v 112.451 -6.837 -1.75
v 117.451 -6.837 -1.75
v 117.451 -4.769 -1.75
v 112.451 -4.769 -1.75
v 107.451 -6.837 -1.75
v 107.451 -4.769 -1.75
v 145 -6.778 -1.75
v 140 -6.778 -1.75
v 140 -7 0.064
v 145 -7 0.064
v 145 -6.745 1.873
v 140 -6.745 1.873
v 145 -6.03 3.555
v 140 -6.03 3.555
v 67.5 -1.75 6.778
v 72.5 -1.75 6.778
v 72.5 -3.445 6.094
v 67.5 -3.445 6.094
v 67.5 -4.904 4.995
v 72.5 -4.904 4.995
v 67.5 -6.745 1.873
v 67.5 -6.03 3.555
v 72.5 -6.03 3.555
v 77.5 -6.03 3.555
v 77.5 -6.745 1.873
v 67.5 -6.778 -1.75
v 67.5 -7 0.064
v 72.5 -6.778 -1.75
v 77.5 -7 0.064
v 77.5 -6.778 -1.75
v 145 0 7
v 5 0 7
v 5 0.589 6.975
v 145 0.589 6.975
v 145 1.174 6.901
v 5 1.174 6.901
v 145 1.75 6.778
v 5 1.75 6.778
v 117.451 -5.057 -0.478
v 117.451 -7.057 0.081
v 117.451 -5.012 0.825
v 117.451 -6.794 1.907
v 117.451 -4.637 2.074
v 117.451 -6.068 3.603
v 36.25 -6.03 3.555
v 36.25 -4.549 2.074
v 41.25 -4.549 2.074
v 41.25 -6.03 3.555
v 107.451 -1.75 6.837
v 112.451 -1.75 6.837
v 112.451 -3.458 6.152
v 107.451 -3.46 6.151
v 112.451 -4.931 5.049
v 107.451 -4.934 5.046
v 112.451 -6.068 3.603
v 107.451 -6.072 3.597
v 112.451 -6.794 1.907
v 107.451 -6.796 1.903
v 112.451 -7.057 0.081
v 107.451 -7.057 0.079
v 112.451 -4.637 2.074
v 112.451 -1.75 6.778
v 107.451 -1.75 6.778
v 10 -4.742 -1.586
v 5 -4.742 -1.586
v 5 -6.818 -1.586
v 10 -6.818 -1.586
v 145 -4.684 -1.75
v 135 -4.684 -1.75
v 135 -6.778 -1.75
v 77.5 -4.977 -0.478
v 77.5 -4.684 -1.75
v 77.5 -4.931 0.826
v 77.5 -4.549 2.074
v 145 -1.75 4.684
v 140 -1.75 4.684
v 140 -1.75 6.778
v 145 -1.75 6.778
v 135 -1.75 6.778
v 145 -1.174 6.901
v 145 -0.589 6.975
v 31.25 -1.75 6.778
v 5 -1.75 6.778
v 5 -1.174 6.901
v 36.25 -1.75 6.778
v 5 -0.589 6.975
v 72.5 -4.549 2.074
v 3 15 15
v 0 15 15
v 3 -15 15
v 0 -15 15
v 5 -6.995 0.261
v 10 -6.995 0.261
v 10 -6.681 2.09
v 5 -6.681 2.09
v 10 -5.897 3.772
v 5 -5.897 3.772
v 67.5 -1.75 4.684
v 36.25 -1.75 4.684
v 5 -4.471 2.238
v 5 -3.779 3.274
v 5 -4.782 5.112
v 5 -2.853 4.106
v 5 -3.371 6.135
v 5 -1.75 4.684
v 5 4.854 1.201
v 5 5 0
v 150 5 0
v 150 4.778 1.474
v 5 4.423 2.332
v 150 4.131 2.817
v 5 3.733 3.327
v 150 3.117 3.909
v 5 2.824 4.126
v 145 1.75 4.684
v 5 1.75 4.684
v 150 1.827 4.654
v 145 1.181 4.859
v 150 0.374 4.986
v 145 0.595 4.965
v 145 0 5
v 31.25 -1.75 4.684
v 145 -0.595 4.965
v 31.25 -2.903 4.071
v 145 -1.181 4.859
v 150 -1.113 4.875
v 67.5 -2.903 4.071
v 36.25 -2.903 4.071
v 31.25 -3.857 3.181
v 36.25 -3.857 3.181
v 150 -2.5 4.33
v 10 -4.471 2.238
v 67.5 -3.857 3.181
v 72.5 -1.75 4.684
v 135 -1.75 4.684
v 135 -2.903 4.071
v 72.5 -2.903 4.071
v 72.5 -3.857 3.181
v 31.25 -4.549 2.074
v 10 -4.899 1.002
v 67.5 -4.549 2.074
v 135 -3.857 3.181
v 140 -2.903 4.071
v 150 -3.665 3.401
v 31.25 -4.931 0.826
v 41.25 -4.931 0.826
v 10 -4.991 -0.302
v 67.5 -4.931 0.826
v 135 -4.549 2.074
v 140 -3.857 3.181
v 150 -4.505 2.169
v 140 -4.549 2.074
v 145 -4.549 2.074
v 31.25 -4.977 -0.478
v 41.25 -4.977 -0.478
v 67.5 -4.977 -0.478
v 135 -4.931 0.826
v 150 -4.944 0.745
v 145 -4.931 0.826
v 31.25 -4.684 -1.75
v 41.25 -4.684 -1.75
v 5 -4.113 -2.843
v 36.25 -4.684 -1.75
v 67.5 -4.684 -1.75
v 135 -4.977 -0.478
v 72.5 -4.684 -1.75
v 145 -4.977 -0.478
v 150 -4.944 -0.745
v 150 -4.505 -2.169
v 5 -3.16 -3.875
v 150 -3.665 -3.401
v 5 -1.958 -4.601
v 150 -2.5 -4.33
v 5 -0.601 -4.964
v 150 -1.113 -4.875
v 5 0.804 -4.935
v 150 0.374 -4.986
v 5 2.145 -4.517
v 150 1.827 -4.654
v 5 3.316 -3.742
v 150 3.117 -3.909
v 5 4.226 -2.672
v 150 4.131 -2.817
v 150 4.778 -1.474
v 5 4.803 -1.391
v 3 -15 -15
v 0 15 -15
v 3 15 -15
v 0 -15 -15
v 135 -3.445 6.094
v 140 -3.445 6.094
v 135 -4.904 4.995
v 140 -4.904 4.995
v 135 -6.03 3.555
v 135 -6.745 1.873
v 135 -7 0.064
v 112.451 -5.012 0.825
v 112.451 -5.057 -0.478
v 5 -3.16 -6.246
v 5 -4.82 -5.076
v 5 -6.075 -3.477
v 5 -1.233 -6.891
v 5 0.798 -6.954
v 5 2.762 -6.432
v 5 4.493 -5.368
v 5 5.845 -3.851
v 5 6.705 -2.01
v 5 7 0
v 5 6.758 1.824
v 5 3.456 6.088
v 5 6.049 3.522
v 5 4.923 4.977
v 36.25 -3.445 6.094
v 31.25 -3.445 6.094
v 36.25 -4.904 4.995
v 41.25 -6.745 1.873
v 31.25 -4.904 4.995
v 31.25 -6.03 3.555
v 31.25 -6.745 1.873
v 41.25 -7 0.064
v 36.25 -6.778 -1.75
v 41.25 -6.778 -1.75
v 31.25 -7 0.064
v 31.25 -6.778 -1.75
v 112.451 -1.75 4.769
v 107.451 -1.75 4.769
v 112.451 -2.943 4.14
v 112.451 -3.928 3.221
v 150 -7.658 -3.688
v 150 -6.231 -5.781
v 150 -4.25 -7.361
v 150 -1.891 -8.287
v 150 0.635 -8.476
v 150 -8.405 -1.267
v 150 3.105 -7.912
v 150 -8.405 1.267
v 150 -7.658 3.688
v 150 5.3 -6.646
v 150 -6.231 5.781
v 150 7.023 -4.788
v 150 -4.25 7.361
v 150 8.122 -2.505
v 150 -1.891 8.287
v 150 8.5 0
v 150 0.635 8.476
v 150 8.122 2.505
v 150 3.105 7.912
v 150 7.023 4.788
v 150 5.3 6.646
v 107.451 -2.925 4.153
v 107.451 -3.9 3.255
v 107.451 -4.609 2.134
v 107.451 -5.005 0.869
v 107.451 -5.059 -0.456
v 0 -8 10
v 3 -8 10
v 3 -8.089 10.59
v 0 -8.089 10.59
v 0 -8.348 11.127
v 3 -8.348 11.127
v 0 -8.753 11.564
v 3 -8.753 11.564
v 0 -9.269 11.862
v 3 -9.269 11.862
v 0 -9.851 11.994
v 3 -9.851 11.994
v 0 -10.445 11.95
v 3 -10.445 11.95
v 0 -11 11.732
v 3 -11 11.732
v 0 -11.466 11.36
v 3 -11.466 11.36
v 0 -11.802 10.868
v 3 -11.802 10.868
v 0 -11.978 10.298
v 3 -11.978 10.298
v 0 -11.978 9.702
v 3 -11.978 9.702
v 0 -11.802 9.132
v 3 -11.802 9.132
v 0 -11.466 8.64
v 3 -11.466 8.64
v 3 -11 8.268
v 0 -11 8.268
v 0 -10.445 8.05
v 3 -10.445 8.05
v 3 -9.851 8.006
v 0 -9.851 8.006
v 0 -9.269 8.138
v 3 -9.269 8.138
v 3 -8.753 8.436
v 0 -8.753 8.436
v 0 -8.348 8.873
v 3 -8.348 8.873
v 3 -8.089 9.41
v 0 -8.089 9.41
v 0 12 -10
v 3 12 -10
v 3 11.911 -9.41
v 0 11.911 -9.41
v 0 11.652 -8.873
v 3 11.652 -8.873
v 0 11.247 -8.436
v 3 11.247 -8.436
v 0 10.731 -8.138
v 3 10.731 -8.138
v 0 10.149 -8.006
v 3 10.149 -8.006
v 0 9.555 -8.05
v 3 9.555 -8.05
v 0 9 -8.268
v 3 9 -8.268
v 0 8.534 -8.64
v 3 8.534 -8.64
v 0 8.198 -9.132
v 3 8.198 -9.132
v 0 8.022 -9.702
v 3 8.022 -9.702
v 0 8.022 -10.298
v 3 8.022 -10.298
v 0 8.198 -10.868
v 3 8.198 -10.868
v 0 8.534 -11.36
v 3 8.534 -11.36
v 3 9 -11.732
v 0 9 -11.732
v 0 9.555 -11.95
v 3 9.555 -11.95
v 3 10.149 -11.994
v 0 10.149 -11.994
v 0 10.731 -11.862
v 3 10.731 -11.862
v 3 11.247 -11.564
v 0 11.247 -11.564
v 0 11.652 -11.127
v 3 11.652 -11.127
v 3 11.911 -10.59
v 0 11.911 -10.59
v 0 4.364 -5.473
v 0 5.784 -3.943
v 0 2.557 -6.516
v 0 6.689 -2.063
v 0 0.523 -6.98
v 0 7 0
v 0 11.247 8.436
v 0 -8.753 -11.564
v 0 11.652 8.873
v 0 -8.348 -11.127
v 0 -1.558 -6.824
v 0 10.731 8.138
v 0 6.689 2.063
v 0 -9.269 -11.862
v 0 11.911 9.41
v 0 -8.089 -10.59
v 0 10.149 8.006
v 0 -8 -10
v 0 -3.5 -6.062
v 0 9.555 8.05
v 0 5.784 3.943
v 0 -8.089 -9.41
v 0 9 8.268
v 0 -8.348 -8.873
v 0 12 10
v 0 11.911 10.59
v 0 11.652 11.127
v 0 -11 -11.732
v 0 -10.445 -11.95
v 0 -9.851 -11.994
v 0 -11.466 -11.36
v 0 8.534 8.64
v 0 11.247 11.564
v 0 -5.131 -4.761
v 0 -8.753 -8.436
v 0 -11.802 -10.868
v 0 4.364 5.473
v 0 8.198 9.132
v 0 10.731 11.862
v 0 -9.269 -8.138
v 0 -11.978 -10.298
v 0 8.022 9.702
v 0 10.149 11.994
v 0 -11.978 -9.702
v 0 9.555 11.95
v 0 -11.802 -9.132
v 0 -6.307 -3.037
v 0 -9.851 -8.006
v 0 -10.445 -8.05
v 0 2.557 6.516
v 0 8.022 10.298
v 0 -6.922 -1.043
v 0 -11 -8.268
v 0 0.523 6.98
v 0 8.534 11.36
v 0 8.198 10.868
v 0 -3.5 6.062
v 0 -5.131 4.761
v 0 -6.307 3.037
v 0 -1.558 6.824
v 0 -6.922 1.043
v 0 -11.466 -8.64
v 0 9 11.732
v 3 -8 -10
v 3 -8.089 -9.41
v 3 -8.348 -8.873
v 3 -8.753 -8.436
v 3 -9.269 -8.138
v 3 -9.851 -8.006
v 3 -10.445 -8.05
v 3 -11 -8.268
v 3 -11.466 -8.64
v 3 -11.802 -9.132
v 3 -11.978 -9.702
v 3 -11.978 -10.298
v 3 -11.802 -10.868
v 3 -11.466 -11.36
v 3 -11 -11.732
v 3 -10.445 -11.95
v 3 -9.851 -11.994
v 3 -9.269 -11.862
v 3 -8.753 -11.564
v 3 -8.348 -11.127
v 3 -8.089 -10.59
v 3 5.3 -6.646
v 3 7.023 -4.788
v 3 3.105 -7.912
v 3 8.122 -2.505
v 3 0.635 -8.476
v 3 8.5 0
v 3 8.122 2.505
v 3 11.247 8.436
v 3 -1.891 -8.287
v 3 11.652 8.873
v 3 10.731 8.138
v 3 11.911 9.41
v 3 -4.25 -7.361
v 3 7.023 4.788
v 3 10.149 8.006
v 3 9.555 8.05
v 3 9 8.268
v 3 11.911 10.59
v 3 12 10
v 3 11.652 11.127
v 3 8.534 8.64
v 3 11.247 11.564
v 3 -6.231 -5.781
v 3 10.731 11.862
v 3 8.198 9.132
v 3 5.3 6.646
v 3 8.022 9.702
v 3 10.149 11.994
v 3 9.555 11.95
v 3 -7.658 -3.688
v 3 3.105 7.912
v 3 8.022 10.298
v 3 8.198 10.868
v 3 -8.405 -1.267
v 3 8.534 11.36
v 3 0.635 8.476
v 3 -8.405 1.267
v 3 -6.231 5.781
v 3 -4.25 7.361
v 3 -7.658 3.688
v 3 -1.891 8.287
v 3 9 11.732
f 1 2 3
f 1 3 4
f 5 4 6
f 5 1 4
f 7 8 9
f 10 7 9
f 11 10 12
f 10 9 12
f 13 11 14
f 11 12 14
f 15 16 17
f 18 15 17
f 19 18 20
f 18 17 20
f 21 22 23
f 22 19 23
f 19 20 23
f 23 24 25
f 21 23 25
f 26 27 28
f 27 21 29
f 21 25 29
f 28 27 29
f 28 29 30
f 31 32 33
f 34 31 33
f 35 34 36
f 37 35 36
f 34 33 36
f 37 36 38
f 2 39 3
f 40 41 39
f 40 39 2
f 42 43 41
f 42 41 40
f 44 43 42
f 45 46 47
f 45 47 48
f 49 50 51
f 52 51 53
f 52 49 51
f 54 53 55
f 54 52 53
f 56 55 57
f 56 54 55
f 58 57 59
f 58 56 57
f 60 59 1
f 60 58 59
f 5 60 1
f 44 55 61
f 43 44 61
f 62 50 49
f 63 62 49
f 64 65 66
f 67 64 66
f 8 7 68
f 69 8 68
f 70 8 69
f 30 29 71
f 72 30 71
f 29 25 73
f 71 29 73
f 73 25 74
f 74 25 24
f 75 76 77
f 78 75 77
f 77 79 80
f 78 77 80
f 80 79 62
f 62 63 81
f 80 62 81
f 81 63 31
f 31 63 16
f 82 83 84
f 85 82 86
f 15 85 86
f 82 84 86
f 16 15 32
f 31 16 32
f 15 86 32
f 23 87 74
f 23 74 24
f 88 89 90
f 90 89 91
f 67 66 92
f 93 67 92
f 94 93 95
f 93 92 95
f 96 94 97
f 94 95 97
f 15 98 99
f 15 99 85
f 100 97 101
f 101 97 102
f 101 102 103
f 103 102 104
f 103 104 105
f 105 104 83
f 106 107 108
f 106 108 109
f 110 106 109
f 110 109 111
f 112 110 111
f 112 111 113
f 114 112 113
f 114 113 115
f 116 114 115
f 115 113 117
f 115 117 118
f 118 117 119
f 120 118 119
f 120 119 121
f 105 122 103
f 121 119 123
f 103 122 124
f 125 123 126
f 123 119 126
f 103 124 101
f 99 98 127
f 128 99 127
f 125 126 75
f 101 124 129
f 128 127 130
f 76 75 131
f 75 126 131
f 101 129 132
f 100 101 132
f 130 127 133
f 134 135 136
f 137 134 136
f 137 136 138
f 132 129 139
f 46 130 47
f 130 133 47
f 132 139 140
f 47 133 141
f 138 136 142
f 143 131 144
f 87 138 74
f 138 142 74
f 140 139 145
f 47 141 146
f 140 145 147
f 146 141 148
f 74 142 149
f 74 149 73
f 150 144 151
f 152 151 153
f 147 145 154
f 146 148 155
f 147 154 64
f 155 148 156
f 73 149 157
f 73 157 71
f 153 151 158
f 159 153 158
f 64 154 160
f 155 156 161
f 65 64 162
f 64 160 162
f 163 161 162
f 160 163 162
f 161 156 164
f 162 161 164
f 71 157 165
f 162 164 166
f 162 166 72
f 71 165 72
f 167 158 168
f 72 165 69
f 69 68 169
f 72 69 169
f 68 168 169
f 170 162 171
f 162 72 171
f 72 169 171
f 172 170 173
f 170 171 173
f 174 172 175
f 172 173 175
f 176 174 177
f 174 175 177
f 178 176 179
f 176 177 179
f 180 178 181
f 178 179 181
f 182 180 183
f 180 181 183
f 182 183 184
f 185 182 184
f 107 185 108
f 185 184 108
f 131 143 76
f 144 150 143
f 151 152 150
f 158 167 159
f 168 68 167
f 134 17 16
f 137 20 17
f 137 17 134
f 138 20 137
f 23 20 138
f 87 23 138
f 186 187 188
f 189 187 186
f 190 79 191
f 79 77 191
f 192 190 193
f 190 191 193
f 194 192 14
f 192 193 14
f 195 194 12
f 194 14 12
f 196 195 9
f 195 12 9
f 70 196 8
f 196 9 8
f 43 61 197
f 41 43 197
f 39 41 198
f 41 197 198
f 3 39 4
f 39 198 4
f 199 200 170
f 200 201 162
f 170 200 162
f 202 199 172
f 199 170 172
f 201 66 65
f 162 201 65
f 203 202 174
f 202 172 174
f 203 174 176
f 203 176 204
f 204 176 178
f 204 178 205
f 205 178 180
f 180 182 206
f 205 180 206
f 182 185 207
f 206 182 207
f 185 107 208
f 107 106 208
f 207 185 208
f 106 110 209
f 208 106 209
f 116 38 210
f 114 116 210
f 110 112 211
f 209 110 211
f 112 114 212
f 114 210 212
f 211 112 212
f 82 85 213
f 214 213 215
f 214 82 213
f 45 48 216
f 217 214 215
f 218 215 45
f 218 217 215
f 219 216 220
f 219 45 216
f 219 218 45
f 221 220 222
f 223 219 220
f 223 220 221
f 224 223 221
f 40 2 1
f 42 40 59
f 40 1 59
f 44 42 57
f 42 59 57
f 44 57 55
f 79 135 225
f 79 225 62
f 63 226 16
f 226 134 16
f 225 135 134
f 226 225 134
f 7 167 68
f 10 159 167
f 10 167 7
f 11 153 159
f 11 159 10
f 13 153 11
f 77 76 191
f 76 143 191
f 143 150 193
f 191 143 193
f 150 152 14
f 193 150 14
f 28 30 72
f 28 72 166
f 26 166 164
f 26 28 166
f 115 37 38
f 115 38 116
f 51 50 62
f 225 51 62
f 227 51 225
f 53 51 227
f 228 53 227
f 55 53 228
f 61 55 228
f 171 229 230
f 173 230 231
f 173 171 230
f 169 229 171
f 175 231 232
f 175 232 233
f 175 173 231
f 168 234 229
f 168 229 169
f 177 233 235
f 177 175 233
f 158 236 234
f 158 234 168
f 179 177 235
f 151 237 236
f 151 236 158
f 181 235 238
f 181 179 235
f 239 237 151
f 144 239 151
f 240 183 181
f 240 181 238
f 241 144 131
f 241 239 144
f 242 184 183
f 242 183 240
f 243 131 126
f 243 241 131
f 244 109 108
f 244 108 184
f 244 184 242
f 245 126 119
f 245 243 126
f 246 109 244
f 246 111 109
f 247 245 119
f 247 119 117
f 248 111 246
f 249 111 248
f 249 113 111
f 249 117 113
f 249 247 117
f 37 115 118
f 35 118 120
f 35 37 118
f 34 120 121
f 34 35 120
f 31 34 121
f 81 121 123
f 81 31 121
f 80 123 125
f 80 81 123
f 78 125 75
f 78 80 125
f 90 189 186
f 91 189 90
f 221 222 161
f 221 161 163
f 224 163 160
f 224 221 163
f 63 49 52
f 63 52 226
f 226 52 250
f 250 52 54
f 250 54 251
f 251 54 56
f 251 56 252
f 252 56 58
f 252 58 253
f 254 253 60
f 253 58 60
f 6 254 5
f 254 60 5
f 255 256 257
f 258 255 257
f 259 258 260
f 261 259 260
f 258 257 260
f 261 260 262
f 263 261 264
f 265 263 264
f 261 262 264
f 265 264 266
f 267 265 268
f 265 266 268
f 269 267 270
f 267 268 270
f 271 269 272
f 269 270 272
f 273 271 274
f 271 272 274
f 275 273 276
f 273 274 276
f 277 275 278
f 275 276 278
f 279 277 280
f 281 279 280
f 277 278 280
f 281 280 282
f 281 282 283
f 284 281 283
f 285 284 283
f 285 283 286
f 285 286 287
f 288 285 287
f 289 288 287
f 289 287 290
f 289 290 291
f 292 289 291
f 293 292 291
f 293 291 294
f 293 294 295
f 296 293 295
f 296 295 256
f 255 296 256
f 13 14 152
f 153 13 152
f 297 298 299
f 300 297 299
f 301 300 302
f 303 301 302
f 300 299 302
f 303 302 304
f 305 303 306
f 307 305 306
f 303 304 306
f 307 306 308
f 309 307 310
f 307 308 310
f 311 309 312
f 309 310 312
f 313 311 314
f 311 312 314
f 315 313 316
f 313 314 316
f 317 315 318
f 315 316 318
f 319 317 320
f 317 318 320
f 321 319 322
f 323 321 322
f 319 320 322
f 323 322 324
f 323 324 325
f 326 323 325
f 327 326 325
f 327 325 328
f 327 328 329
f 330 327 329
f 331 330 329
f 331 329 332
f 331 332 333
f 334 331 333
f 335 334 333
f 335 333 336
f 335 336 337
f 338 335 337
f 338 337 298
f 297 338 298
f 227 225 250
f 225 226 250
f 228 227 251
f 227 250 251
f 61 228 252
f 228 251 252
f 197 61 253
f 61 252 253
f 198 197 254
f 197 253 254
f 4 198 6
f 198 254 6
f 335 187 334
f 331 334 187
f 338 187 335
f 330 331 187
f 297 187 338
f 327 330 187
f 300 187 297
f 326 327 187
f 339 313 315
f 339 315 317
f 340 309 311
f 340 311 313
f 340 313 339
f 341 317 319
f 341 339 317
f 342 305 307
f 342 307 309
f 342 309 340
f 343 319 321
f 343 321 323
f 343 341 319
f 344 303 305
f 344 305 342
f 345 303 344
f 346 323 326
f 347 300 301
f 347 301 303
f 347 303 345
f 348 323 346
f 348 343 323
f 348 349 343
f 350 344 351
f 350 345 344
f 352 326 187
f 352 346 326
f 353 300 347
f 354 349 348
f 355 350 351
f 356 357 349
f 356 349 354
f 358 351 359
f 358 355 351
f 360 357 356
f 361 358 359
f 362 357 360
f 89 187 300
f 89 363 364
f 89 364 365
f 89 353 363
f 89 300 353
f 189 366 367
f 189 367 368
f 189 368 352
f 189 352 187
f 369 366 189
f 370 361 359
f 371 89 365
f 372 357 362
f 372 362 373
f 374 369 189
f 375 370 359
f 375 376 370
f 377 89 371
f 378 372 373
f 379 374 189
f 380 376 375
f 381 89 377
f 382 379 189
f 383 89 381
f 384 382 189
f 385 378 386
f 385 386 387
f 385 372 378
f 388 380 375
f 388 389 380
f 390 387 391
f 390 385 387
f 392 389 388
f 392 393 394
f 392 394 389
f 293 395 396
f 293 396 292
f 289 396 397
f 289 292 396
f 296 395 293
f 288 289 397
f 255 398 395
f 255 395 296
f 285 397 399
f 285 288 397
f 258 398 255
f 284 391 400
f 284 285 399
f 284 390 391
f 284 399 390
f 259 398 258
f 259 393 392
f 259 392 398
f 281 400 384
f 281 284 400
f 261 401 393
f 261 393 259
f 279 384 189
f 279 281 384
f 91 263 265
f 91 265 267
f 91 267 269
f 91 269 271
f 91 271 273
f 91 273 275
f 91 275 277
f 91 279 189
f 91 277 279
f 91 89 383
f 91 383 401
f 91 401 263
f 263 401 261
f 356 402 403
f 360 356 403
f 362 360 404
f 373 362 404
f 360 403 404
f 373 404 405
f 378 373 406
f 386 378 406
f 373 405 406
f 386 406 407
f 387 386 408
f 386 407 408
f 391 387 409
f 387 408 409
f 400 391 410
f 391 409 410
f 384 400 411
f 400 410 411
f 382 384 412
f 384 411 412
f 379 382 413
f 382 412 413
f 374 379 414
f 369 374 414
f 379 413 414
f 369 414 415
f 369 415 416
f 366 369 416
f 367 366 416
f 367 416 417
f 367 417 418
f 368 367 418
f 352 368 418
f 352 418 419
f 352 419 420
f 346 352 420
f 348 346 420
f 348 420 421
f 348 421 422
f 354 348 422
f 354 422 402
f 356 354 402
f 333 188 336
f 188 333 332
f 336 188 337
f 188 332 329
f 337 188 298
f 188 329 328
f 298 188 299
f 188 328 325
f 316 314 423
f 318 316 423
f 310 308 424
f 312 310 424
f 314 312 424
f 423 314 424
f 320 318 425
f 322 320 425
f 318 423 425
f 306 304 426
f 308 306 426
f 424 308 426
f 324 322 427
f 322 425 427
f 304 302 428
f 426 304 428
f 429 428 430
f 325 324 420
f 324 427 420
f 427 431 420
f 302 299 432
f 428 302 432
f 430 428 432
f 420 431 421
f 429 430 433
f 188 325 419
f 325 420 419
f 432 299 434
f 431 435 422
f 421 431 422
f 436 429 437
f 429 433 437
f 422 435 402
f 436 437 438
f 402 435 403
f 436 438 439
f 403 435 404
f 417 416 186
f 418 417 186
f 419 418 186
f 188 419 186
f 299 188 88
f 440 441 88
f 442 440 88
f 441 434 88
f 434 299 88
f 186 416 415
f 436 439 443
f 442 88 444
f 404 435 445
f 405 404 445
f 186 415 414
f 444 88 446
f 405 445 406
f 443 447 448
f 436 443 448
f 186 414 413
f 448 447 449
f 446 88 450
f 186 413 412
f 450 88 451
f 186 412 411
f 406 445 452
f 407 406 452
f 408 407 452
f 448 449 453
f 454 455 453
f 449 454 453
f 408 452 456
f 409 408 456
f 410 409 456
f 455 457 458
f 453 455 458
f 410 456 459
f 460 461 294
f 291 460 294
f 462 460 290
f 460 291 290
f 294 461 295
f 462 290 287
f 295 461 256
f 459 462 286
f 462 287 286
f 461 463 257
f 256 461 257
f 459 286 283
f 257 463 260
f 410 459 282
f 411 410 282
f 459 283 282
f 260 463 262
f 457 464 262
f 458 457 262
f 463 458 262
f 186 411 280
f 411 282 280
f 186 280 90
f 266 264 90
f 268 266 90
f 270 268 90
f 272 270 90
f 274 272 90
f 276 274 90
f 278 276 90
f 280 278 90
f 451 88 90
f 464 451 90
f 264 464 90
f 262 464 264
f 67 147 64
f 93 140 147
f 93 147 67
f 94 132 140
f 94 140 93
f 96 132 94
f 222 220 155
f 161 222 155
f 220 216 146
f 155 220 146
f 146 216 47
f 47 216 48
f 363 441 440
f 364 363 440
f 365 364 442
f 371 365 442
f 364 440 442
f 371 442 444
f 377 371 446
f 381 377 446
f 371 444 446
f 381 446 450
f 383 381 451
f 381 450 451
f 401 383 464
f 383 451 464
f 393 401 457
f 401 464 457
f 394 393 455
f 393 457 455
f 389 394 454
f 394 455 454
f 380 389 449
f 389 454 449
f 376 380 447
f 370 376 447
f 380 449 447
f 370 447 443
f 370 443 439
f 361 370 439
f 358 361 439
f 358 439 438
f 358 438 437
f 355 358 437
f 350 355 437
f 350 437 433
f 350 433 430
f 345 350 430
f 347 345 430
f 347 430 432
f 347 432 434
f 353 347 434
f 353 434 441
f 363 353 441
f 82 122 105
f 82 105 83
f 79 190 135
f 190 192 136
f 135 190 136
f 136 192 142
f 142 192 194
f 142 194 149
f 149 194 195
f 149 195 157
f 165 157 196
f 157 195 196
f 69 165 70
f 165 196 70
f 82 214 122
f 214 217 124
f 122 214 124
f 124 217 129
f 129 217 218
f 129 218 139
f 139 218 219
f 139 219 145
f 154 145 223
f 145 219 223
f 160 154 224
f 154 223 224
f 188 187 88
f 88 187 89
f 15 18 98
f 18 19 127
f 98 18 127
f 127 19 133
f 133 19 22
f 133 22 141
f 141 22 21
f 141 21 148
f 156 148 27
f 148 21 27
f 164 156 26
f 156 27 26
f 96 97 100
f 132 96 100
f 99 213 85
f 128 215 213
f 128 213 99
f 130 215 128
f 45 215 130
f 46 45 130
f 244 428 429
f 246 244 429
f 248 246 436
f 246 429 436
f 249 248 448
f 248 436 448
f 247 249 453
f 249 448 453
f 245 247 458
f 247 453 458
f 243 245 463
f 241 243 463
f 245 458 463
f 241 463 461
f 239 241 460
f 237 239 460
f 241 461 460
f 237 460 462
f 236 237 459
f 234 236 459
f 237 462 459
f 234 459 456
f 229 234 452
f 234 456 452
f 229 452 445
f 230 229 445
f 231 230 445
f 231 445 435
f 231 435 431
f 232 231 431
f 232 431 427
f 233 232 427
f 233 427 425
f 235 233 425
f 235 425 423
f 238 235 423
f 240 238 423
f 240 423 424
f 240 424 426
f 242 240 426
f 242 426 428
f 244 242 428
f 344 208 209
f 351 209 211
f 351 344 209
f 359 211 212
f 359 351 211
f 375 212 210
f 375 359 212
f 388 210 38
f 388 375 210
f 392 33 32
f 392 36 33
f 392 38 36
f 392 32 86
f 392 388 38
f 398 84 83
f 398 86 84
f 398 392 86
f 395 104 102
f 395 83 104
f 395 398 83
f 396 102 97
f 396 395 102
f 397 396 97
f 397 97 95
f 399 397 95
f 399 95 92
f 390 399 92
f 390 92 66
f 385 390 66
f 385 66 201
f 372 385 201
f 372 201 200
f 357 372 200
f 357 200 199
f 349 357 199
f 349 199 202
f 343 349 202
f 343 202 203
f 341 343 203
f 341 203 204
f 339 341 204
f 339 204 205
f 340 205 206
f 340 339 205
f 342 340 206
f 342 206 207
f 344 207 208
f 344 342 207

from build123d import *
from build123d import SkipClean  # not in build123d's __all__

# Parameters (mm, degrees)
F0_R      = 8.5
F0_R_2    = 7
F1_DEPTH  = 150
F2_R      = 7
F2_R_2    = 5
F3_DEPTH  = 145
F4_W      = 30
F4_H      = 30
F4_R      = 8.5
F5_DEPTH  = 3
F7_D      = 4
F9_DEPTH  = 140
F12_ANGLE = 90
F14_DEPTH = 5
F15_W     = 2.5
F15_H     = 2.0939723571
F16_ANGLE = 90
F18_DEPTH = 10
F19_W     = 5
F19_H     = 2.0680303106
F20_ANGLE = 90
F22_DEPTH = 5
F23_W     = 5
F23_H     = 2.0939723571
F24_ANGLE = 90
F26_DEPTH = 10
F27_W     = 5
F27_H     = 2.0939723571
F28_ANGLE = 90
F30_DEPTH = 5


# Not quite as in the source:
# - after a boolean that leaves OpenCascade's solid faulty, fix() repairs it


with BuildPart() as f1:
    # F0 (on Right) → F1 (new body)
    with BuildSketch(Plane.YZ):
        Circle(F0_R)
        Circle(F0_R_2, mode=Mode.SUBTRACT)
    extrude(amount=F1_DEPTH)

    # F2 (on face) → F3 (join)
    with BuildSketch(Plane.YZ.offset(150)):
        Circle(F2_R)
        Circle(F2_R_2, mode=Mode.SUBTRACT)
    extrude(amount=-F3_DEPTH)

    # F4 (on face) → F5 (join)
    with BuildSketch(Plane(origin=(0, 0, 0), x_dir=(0, -1, 0), z_dir=(-1, 0, 0))):
        Rectangle(F4_W, F4_H)
        Circle(F4_R, mode=Mode.SUBTRACT)
    extrude(amount=-F5_DEPTH)

    # F7 (through all)
    with Locations(Plane(origin=(0, 0, 0), x_dir=(0, -1, 0), z_dir=(-1, 0, 0))):
        with Locations((-10, 10), (10, 10), (10, -10), (-10, -10)):
            Hole(F7_D / 2)

    # F8 (on face) → F9 (cut)
    with BuildSketch(Plane(origin=(5, 0, 0), x_dir=(0, -1, 0), z_dir=(-1, 0, 0))):
        with BuildLine():
            ThreePointArc((0, 5), (0.8891730726, 4.9203019467), (1.75, 4.6837484988))
            Line((1.75, 4.6837484988), (1.75, 6.7777208559))
            ThreePointArc((1.75, 6.7777208559), (0.8820300474, 6.9442078739), (0, 7))
            Line((0, 7), (0, 5))
        make_face()
        with BuildLine():
            ThreePointArc((-1.75, 4.6837484988), (-0.8891730726, 4.9203019467), (0, 5))
            Line((0, 5), (0, 7))
            ThreePointArc((0, 7), (-0.8820300474, 6.9442078739), (-1.75, 6.7777208559))
            Line((-1.75, 6.7777208559), (-1.75, 4.6837484988))
        make_face()
    extrude(amount=-F9_DEPTH, mode=Mode.SUBTRACT)

    # F10 (on face) → F12 (revolve, cut)
    with BuildSketch(Plane(origin=(0, -1.75, 0), x_dir=(-1, 0, 0), z_dir=(0, 1, 0))):
        Polygon((-140, 6.7777208559), (-140, 4.7096905453), (-140, 4.6837484988), (-135, 4.6837484988), (-135, 6.7777208559), align=None)
    revolve(axis=Axis((74.9857723713, 0, 0), (1, 0, 0)), revolution_arc=F12_ANGLE, mode=Mode.SUBTRACT)

    # F13 (on face) → F14 (cut)
    with BuildSketch(Plane(origin=(140, 0, 0), x_dir=(0, -1, 0), z_dir=(-1, 0, 0))):
        with BuildLine():
            Line((6.0300092452, 3.5551355111), (4.5493471919, 2.0744734578))
            ThreePointArc((4.5493471919, 2.0744734578), (4.9969153801, 0.17560377), (4.6837484988, -1.75))
            Line((4.6837484988, -1.75), (6.7777208559, -1.75))
            ThreePointArc((6.7777208559, -1.75), (6.9314935824, 0.9769322988), (6.0300092452, 3.5551355111))
        make_face()
    with SkipClean():  # cleaning this boolean's faces spoils the solid; the shape is the same uncleaned
        extrude(amount=-F14_DEPTH, mode=Mode.SUBTRACT)

    # F15 (on face) → F16 (revolve, cut)
    with BuildSketch(Plane(origin=(0, -1.75, 0), x_dir=(-1, 0, 0), z_dir=(0, 1, 0))):
        with Locations((-68.75, 5.7307346773)):
            Rectangle(F15_W, F15_H)
        with Locations((-71.25, 5.7307346773)):
            Rectangle(F15_W, F15_H)
    revolve(axis=Axis((74.9857723713, 0, 0), (1, 0, 0)), revolution_arc=F16_ANGLE, mode=Mode.SUBTRACT)

    add(f1.part.fix(), mode=Mode.REPLACE)

    # F17 (on face) → F18 (cut)
    with BuildSketch(Plane.YZ.offset(67.5)):
        with BuildLine():
            ThreePointArc((-4.6837484988, -1.75), (-4.9969153801, 0.17560377), (-4.5493471919, 2.0744734578))
            Line((-4.5493471919, 2.0744734578), (-6.0300092452, 3.5551355111))
            ThreePointArc((-6.0300092452, 3.5551355111), (-6.9314935824, 0.9769322988), (-6.7777208559, -1.75))
            Line((-6.7777208559, -1.75), (-4.6837484988, -1.75))
        make_face()
    extrude(amount=F18_DEPTH, mode=Mode.SUBTRACT)

    # F19 (on face) → F20 (revolve, cut)
    with BuildSketch(Plane(origin=(0, -1.75, 0), x_dir=(-1, 0, 0), z_dir=(0, 1, 0))):
        with Locations((-109.95097965, 5.8026228816)):
            Rectangle(F19_W, F19_H)
    revolve(axis=Axis((112.4786585569, 0, 0), (1, 0, 0)), revolution_arc=F20_ANGLE, mode=Mode.SUBTRACT)

    # F21 (on face) → F22 (cut)
    with BuildSketch(Plane(origin=(112.45097965, 0, 0), x_dir=(0, -1, 0), z_dir=(-1, 0, 0))):
        with BuildLine():
            ThreePointArc((6.8366380369, -1.75), (6.9854372426, 1.0028889159), (6.068155613, 3.6027221796))
            Line((6.068155613, 3.6027221796), (4.6366684016, 2.07447))
            ThreePointArc((4.6366684016, 2.07447), (5.0765586233, 0.1751347812), (4.7686077263, -1.75))
            Line((4.7686077263, -1.75), (6.8366380369, -1.75))
        make_face()
    extrude(amount=-F22_DEPTH, mode=Mode.SUBTRACT)

    # F23 (on face) → F24 (revolve, cut)
    with BuildSketch(Plane(origin=(0, -1.75, 0), x_dir=(-1, 0, 0), z_dir=(0, 1, 0))):
        with Locations((-33.75, 5.7307346773)):
            Rectangle(F23_W, F23_H)
    revolve(axis=Axis((74.9857723713, 0, 0), (1, 0, 0)), revolution_arc=F24_ANGLE, mode=Mode.SUBTRACT)

    # F25 (on face) → F26 (cut)
    with BuildSketch(Plane.YZ.offset(31.25)):
        with BuildLine():
            ThreePointArc((-4.6837484988, -1.75), (-4.9969153801, 0.17560377), (-4.5493471919, 2.0744734578))
            Line((-4.5493471919, 2.0744734578), (-6.0300092452, 3.5551355111))
            ThreePointArc((-6.0300092452, 3.5551355111), (-6.9314935824, 0.9769322988), (-6.7777208559, -1.75))
            Line((-6.7777208559, -1.75), (-4.6837484988, -1.75))
        make_face()
    extrude(amount=F26_DEPTH, mode=Mode.SUBTRACT)

    # F27 (on face) → F28 (revolve)
    with BuildSketch(Plane(origin=(0, -1.75, 0), x_dir=(-1, 0, 0), z_dir=(0, 1, 0))):
        with Locations((-7.5, 5.7307346773)):
            Rectangle(F27_W, F27_H)
    revolve(axis=Axis((74.9857723713, 0, 0), (1, 0, 0)), revolution_arc=F28_ANGLE)

    # F29 (on face) → F30 (cut)
    with BuildSketch(Plane(origin=(5, 0, 0), x_dir=(0, -1, 0), z_dir=(-1, 0, 0))):
        with BuildLine():
            Line((5.896972825, 3.7716987554), (4.4710360492, 2.2382664379))
            ThreePointArc((4.4710360492, 2.2382664379), (4.9875229666, 0.3530080143), (4.7417252408, -1.5862035621))
            Line((4.7417252408, -1.5862035621), (6.8179145096, -1.5862035621))
            ThreePointArc((6.8179145096, -1.5862035621), (6.8988310092, 1.185803823), (5.896972825, 3.7716987554))
        make_face()
    extrude(amount=-F30_DEPTH, mode=Mode.SUBTRACT)

    add(f1.part.fix(), mode=Mode.REPLACE)


solid = f1.part
